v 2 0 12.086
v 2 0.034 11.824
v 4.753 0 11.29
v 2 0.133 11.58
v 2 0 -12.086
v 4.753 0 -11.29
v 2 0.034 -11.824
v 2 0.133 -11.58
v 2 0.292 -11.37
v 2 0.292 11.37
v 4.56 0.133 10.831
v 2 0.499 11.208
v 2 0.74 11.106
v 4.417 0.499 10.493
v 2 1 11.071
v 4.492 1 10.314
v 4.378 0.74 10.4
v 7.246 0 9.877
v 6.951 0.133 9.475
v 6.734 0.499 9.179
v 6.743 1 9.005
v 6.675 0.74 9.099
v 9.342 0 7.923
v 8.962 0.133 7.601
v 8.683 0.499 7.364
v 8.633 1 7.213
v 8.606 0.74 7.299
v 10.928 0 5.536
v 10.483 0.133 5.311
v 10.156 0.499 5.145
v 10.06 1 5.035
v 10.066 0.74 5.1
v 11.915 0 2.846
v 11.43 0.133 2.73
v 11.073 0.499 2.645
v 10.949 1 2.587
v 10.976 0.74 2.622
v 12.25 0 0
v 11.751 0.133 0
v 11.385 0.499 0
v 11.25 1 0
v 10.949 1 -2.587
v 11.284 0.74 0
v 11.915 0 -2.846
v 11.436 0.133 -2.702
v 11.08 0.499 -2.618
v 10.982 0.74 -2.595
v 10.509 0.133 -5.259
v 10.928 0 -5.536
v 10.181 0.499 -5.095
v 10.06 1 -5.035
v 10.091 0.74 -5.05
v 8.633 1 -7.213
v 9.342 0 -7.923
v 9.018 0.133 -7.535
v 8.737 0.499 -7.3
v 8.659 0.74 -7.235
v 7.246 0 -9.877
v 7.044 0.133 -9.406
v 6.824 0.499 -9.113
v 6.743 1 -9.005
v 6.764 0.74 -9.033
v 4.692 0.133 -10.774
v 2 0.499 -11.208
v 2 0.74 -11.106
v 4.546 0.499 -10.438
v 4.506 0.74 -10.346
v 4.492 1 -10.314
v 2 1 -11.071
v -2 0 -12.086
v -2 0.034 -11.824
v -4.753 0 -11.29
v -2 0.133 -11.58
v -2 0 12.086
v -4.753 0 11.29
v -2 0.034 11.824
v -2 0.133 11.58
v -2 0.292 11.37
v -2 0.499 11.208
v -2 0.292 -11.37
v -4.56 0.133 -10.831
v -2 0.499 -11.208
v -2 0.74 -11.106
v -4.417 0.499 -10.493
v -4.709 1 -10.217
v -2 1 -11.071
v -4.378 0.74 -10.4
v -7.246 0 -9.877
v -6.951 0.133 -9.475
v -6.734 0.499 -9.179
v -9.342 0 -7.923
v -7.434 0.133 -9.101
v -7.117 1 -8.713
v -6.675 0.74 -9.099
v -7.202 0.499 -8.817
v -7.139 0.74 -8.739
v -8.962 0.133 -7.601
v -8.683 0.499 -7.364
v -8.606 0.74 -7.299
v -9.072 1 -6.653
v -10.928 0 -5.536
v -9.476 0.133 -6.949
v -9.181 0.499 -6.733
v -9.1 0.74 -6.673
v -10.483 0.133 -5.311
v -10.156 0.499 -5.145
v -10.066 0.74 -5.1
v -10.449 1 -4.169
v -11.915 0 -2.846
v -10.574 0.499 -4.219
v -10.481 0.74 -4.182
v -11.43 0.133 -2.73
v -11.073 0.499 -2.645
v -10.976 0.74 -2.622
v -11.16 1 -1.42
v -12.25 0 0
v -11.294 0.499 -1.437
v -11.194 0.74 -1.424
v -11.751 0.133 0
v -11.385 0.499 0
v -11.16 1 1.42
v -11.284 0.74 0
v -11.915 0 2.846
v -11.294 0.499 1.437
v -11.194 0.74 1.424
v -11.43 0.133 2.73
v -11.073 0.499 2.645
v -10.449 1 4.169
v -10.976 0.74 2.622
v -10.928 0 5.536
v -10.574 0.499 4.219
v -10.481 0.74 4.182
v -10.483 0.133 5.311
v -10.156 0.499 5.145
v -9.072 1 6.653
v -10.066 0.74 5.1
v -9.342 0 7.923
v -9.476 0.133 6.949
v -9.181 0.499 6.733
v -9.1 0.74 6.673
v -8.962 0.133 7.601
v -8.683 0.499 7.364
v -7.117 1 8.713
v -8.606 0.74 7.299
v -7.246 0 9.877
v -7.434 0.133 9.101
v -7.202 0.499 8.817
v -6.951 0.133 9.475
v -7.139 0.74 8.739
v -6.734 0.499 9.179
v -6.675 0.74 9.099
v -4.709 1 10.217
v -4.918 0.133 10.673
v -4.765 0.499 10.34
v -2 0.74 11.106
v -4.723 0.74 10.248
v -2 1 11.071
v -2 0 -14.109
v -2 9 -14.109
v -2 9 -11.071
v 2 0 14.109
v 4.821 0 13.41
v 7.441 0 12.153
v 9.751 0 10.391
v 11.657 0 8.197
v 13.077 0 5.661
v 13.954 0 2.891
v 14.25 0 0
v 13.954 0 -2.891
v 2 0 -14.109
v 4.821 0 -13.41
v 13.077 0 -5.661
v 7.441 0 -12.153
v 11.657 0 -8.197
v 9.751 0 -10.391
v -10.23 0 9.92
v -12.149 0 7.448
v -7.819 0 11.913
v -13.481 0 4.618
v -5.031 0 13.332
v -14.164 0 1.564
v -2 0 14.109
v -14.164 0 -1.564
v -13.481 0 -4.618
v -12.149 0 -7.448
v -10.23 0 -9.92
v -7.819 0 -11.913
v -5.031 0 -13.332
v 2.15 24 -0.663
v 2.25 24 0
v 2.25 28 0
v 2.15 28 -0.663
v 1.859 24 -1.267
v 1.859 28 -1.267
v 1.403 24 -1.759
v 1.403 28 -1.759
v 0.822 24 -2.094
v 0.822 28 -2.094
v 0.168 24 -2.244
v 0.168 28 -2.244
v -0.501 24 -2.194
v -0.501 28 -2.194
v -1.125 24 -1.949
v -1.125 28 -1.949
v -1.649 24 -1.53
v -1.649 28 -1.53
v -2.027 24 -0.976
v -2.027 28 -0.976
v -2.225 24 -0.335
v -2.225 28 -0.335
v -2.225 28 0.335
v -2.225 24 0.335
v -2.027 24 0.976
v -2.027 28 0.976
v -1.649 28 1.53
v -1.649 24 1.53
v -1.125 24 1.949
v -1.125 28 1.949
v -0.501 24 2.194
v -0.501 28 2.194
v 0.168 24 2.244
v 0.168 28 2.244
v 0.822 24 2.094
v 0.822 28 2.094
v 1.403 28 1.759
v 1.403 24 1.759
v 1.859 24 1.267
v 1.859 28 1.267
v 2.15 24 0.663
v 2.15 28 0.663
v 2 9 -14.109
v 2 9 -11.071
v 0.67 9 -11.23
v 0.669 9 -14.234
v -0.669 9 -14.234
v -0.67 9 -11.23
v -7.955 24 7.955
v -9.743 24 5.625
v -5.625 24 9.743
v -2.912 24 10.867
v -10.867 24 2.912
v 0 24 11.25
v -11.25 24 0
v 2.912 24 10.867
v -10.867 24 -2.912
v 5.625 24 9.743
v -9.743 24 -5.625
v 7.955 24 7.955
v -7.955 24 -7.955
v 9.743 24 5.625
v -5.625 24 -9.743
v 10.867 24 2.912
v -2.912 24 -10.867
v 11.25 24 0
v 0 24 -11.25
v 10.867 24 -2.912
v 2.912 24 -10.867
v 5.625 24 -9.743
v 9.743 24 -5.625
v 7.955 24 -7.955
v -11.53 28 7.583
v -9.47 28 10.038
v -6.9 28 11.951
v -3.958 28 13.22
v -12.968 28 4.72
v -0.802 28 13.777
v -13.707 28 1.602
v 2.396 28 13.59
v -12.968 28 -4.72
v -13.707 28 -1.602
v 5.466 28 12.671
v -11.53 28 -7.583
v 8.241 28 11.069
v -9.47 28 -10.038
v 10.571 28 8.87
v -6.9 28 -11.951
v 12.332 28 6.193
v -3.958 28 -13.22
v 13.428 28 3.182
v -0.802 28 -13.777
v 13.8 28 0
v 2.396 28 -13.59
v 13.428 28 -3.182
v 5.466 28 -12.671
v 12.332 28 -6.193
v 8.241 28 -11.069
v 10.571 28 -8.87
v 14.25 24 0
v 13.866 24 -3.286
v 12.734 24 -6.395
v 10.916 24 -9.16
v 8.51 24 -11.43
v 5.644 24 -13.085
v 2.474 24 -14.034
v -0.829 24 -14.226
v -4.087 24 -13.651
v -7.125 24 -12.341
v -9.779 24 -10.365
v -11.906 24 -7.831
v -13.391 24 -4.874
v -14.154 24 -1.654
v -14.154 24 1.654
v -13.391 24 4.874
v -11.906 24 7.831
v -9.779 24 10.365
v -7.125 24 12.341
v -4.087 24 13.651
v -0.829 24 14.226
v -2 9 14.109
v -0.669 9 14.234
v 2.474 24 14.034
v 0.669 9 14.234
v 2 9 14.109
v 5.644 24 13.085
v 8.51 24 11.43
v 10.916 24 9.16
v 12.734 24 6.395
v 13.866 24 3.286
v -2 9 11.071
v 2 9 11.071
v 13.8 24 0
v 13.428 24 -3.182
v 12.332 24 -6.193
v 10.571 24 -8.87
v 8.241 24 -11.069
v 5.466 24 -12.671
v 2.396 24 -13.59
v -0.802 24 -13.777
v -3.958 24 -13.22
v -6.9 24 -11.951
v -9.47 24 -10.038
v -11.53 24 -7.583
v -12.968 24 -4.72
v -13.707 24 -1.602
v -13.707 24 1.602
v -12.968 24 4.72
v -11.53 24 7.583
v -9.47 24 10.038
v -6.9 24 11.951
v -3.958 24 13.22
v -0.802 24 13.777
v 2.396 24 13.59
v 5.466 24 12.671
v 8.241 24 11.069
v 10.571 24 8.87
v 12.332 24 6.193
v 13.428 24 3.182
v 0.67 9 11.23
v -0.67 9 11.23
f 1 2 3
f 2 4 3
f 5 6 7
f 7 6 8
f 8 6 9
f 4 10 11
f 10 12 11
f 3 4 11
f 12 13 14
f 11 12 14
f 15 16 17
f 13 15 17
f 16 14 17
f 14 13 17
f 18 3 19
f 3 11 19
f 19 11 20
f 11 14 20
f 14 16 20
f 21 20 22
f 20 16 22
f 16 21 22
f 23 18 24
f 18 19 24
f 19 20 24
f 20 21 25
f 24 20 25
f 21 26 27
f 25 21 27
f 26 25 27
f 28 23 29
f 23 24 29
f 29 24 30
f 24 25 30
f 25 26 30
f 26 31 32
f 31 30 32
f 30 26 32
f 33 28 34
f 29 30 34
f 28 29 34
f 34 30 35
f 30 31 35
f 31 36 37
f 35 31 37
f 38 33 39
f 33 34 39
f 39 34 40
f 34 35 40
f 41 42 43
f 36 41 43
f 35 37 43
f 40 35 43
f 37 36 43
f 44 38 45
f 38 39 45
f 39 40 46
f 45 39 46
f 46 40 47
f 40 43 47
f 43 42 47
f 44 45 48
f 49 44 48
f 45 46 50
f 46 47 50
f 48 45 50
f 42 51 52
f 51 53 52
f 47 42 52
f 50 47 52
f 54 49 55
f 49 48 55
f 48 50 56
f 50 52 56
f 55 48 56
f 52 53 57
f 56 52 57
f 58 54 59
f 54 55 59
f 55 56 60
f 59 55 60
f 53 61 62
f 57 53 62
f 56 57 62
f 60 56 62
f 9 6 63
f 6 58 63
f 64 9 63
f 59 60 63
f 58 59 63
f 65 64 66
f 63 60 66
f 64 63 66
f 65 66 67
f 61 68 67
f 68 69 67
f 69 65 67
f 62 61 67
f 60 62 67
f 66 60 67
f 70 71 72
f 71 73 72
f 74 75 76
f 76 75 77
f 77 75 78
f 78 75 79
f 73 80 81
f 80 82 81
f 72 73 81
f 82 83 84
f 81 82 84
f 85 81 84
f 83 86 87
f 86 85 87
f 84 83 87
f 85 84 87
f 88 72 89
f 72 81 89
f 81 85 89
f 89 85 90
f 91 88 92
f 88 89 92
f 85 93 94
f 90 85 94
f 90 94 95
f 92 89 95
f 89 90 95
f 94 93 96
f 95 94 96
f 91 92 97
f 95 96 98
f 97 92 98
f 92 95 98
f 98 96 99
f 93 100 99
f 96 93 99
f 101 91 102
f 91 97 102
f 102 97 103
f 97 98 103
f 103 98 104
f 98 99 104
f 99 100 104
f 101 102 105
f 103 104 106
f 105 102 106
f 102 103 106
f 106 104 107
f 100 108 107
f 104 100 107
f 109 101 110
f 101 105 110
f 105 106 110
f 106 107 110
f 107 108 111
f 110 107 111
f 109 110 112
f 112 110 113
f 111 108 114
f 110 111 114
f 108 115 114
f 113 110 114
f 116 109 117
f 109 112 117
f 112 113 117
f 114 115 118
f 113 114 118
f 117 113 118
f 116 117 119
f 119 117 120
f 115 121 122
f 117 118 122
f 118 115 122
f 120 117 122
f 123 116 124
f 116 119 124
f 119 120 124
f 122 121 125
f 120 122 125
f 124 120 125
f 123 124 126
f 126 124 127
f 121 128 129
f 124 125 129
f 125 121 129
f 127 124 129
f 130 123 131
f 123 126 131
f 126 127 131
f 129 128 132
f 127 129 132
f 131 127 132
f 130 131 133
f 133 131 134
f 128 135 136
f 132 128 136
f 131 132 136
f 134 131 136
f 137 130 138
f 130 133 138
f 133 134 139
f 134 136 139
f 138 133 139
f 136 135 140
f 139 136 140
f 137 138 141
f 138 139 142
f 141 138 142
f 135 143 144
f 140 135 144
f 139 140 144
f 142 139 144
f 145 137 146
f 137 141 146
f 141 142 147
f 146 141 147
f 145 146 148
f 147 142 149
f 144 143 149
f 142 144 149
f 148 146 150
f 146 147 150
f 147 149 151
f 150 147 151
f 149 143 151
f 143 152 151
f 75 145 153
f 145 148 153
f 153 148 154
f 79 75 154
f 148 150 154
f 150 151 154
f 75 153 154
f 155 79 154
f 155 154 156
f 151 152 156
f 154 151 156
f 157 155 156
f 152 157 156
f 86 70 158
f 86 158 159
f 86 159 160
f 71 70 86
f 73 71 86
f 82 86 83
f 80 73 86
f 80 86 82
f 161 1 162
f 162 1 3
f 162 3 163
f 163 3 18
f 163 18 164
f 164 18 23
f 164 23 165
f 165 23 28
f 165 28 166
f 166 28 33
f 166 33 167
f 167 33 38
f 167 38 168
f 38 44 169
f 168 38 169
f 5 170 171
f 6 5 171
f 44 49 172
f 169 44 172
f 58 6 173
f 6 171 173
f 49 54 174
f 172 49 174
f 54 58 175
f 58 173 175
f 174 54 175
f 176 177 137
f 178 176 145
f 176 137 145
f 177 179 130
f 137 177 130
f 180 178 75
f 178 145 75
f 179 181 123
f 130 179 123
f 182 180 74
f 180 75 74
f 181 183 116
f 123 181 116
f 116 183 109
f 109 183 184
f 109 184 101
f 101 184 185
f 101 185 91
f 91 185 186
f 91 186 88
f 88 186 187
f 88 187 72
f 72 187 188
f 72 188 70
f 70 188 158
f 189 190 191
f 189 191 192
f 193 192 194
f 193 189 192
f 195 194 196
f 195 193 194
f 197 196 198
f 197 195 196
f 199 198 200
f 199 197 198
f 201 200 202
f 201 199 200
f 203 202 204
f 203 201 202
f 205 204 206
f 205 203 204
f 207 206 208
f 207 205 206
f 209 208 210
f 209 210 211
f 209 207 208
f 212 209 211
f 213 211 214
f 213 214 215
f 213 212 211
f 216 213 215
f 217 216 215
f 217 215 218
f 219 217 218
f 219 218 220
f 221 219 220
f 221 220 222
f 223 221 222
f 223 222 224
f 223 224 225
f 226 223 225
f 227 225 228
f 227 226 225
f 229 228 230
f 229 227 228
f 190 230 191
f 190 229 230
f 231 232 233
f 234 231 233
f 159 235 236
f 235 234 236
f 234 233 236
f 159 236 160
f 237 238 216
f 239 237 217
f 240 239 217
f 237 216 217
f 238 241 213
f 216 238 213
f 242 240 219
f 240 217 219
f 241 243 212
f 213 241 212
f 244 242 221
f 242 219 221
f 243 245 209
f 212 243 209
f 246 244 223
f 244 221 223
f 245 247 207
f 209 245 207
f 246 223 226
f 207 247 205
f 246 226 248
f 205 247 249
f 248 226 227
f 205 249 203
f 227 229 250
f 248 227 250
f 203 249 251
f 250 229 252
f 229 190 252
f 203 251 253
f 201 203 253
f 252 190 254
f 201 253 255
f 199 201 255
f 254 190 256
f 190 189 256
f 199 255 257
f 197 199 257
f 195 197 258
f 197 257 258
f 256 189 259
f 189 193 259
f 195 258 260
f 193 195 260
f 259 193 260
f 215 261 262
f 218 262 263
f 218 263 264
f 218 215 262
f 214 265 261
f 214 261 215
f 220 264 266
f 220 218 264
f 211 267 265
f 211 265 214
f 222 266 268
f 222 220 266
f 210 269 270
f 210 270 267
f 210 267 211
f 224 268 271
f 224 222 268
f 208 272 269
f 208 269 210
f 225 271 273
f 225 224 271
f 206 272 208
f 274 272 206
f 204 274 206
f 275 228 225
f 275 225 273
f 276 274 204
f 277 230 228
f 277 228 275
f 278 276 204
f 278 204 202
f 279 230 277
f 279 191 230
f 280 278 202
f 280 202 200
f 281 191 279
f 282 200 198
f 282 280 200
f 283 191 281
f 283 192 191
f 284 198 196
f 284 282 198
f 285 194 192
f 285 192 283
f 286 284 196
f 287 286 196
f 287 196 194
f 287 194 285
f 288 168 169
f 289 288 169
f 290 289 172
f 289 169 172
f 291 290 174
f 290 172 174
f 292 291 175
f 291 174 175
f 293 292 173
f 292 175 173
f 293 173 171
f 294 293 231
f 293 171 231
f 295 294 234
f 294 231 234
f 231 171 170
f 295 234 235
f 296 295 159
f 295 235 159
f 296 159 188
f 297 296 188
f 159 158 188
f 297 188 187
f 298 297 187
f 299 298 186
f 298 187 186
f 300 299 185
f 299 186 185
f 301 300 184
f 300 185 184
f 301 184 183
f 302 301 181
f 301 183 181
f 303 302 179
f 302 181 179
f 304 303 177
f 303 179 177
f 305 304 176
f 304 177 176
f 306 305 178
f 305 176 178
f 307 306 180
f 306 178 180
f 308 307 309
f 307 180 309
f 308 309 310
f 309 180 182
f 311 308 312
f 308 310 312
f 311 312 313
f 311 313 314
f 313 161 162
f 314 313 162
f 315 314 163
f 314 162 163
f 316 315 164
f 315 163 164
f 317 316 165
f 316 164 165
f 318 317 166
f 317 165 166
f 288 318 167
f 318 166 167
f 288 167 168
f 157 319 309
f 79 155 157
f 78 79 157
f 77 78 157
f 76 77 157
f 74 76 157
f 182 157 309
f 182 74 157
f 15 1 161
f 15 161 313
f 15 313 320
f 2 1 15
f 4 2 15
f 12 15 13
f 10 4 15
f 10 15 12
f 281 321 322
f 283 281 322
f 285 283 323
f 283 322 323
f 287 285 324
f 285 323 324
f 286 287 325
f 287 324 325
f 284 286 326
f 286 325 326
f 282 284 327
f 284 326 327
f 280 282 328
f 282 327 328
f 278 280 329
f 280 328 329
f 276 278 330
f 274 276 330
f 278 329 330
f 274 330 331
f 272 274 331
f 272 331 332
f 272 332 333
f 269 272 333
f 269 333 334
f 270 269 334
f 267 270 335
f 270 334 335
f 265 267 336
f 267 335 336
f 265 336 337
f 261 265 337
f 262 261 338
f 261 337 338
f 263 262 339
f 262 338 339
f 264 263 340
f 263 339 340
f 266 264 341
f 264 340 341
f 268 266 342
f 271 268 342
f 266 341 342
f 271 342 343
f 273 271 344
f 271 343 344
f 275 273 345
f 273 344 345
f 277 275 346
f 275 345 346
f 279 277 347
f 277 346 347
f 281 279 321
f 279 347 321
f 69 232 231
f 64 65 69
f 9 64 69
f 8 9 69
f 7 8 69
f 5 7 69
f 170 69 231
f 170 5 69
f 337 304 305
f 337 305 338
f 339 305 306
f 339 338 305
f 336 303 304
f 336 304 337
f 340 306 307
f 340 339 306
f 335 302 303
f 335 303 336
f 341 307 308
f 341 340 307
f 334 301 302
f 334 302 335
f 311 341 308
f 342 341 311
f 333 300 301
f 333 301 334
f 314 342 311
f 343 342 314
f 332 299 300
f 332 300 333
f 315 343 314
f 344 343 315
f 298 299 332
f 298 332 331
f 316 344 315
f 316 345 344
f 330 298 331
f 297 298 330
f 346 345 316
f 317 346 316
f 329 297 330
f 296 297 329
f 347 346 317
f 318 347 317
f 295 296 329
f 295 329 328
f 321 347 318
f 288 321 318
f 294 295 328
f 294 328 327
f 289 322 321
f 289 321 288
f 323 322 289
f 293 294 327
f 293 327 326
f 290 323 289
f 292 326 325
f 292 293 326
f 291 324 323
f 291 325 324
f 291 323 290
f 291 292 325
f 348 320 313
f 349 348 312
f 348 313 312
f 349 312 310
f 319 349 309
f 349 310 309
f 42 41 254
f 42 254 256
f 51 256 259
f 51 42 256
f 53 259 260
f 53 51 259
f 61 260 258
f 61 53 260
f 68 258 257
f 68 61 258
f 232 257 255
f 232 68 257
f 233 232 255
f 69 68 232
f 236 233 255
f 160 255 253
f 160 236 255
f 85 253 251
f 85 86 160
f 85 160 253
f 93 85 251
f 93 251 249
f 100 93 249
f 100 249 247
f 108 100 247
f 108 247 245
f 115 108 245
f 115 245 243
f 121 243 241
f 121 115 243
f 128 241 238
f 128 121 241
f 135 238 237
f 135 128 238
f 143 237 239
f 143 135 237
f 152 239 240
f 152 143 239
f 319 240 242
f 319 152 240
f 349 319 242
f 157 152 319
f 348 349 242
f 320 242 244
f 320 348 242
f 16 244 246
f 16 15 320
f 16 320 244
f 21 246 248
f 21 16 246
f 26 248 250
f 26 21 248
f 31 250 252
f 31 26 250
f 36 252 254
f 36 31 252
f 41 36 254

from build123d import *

# Parameters (mm, degrees)
SKETCH1_R           = 14.25
SKETCH1_R_2         = 11.25
BOSS_EXTRUDE1_DEPTH = 24
SKETCH2_R           = 13.8
SKETCH2_R_2         = 2.25
BOSS_EXTRUDE2_DEPTH = 4
FILLET1_R           = 1
CUT_EXTRUDE1_DEPTH  = 9


with BuildPart() as part:
    # Sketch1 → Boss-Extrude1 (new body)
    with BuildSketch(Plane(origin=(0, 0, 0), x_dir=(1, 0, 0), z_dir=(0, 1, 0))):
        Circle(SKETCH1_R)
        Circle(SKETCH1_R_2, mode=Mode.SUBTRACT)
    extrude(amount=BOSS_EXTRUDE1_DEPTH)

    # Sketch2 → Boss-Extrude2 (add)
    with BuildSketch(Plane(origin=(0, 24, 0), x_dir=(1, 0, 0), z_dir=(0, 1, 0))):
        Circle(SKETCH2_R)
        Circle(SKETCH2_R_2, mode=Mode.SUBTRACT)
    extrude(amount=BOSS_EXTRUDE2_DEPTH)

    # Fillet1
    fillet1_edges = [part.edges().sort_by_distance(p)[0] for p in [
        (-11.25, 0, 0),
    ]]
    fillet(fillet1_edges, radius=FILLET1_R)

    # Sketch3 → Cut-Extrude1 (cut)
    with BuildSketch(Plane.XZ):
        with BuildLine():
            Line((2, 14.25), (2, -14.25))
            ThreePointArc((2, -14.25), (0, -16.25), (-2, -14.25))
            Line((-2, -14.25), (-2, 14.25))
            ThreePointArc((-2, 14.25), (0, 16.25), (2, 14.25))
        make_face()
    extrude(amount=-CUT_EXTRUDE1_DEPTH, mode=Mode.SUBTRACT)


solid = part.part
